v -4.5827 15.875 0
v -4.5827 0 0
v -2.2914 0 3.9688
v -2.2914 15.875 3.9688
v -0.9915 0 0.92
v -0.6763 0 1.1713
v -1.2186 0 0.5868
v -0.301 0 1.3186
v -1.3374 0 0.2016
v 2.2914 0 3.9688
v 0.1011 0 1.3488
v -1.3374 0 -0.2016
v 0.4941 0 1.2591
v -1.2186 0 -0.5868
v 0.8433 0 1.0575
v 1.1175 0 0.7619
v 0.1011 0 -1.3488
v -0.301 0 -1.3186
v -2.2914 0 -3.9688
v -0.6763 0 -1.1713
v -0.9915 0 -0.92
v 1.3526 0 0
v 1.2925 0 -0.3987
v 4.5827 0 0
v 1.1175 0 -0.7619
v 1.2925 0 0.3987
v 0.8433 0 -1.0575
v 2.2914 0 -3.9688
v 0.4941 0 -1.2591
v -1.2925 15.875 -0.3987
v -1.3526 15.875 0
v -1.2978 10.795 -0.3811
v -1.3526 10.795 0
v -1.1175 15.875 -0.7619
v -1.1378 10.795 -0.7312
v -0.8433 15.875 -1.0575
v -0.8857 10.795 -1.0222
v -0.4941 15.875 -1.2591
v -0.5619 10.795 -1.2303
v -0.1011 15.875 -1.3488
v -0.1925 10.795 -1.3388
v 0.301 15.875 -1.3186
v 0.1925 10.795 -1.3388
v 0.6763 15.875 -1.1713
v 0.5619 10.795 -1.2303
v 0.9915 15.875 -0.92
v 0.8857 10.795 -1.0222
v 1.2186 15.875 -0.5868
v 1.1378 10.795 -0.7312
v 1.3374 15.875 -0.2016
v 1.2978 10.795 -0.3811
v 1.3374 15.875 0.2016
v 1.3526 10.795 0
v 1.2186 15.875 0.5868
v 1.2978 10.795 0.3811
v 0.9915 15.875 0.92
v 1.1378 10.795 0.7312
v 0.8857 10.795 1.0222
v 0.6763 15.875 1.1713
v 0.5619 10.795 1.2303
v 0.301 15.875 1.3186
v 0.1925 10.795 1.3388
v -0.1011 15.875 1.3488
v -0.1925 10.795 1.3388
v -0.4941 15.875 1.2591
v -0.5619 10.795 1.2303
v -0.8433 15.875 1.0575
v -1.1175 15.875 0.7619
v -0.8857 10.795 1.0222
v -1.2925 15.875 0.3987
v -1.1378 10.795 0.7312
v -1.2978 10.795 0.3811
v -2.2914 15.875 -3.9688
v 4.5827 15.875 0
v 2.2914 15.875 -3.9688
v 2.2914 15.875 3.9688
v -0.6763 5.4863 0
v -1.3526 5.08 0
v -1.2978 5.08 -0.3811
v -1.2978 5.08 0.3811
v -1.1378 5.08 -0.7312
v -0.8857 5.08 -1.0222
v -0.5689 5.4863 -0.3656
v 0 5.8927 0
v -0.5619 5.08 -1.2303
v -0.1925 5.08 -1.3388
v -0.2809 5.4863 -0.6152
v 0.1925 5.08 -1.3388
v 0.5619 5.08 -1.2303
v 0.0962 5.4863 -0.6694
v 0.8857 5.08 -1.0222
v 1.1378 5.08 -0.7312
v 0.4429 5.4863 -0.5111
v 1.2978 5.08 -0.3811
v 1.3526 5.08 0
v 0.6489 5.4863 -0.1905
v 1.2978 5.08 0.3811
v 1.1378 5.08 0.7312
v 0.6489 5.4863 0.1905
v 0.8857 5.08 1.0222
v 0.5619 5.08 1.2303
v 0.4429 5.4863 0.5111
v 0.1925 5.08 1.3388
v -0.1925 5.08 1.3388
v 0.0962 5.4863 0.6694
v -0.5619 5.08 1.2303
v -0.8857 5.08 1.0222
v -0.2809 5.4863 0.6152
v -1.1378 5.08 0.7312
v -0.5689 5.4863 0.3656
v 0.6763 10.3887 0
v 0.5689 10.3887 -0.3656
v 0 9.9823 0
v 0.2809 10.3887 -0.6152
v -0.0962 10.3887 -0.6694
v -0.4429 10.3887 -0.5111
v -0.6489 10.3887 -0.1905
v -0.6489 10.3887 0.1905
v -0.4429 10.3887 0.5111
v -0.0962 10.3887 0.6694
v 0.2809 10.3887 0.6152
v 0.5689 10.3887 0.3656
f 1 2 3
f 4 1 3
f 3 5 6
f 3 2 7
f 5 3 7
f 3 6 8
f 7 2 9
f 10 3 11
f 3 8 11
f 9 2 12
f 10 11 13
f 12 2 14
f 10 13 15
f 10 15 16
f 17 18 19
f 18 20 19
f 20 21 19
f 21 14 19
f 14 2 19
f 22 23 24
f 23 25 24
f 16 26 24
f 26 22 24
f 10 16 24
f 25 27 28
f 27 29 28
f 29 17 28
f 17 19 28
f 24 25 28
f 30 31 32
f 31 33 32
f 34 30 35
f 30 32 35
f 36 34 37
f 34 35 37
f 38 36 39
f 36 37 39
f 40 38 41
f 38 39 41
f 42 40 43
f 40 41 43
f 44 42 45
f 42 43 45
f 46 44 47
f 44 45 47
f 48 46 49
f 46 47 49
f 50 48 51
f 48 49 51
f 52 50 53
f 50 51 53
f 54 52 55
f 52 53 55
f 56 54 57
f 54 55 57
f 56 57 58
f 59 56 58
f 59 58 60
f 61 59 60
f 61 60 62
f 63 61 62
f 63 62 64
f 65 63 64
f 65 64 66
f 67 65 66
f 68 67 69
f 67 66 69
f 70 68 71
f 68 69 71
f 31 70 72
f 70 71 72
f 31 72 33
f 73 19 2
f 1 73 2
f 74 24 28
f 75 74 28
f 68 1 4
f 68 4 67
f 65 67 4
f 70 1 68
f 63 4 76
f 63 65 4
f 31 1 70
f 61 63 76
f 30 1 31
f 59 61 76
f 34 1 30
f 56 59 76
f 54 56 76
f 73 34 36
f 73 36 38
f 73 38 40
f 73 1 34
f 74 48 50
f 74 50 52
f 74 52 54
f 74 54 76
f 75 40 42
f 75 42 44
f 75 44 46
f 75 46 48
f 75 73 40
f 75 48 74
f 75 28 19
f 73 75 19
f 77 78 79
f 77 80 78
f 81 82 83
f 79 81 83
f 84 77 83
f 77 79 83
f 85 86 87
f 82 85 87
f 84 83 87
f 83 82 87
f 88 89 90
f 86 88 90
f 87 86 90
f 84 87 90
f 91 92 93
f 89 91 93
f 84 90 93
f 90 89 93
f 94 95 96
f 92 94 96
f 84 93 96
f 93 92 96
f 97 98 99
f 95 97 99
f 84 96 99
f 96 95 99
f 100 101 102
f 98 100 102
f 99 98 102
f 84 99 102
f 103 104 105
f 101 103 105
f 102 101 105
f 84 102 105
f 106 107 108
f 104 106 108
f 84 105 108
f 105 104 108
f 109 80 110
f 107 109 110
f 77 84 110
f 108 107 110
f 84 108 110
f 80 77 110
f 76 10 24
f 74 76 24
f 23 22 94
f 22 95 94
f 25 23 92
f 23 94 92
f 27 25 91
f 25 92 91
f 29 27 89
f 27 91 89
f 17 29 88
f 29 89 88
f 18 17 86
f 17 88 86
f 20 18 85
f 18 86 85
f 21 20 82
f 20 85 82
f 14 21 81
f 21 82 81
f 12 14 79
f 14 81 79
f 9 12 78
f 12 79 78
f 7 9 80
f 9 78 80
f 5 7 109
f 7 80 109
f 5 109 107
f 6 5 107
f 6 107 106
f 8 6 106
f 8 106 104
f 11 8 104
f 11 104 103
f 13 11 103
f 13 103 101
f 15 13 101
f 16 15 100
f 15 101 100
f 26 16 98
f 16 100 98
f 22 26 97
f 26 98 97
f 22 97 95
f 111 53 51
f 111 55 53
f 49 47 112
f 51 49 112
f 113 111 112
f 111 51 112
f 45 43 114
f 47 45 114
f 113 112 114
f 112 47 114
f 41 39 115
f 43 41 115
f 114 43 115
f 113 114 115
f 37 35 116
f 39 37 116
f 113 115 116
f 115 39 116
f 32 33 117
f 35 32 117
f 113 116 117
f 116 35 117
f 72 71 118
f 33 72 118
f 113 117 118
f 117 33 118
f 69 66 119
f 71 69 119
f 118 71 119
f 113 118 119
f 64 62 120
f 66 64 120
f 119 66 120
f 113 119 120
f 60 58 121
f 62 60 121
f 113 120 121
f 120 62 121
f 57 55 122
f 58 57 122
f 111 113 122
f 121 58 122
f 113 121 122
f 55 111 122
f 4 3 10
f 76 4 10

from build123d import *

# Parameters (mm, degrees)
BOSS_EXTRUDE1_DEPTH       = 15.875
F_6_32_TAPPED_HOLE1_D     = 2.7051
F_6_32_TAPPED_HOLE1_DEPTH = 5.08
F_6_32_TAPPED_HOLE1_TIP   = 0.81269403
F_6_32_TAPPED_HOLE2_D     = 2.7051
F_6_32_TAPPED_HOLE2_DEPTH = 5.08
F_6_32_TAPPED_HOLE2_TIP   = 0.81269403


with BuildPart() as part:
    # Sketch2 → Boss-Extrude1 (new body)
    with BuildSketch(Plane(origin=(0, 0, 0), x_dir=(1, 0, 0), z_dir=(0, 1, 0))):
        Polygon((4.582717762, 0), (2.291358881, 3.96875), (-2.291358881, 3.96875), (-4.582717762, 0), (-2.291358881, -3.96875), (2.291358881, -3.96875), align=None)
    extrude(amount=BOSS_EXTRUDE1_DEPTH)

    # #6-32 Tapped Hole1
    with Locations(Plane(origin=(0, 0, 0), x_dir=(-1, 0, 0), z_dir=(0, -1, 0))):
        with Locations((0, 0)):
            Hole(F_6_32_TAPPED_HOLE1_D / 2, depth=F_6_32_TAPPED_HOLE1_DEPTH)
            with Locations((0, 0, -(F_6_32_TAPPED_HOLE1_DEPTH + F_6_32_TAPPED_HOLE1_TIP / 2))):  # 118° drill point
                Cone(0, F_6_32_TAPPED_HOLE1_D / 2, F_6_32_TAPPED_HOLE1_TIP, mode=Mode.SUBTRACT)

    # #6-32 Tapped Hole2
    with Locations(Plane(origin=(0, 15.875, 0), x_dir=(1, 0, 0), z_dir=(0, 1, 0))):
        with Locations((0, 0)):
            Hole(F_6_32_TAPPED_HOLE2_D / 2, depth=F_6_32_TAPPED_HOLE2_DEPTH)
            with Locations((0, 0, -(F_6_32_TAPPED_HOLE2_DEPTH + F_6_32_TAPPED_HOLE2_TIP / 2))):  # 118° drill point
                Cone(0, F_6_32_TAPPED_HOLE2_D / 2, F_6_32_TAPPED_HOLE2_TIP, mode=Mode.SUBTRACT)


solid = part.part
